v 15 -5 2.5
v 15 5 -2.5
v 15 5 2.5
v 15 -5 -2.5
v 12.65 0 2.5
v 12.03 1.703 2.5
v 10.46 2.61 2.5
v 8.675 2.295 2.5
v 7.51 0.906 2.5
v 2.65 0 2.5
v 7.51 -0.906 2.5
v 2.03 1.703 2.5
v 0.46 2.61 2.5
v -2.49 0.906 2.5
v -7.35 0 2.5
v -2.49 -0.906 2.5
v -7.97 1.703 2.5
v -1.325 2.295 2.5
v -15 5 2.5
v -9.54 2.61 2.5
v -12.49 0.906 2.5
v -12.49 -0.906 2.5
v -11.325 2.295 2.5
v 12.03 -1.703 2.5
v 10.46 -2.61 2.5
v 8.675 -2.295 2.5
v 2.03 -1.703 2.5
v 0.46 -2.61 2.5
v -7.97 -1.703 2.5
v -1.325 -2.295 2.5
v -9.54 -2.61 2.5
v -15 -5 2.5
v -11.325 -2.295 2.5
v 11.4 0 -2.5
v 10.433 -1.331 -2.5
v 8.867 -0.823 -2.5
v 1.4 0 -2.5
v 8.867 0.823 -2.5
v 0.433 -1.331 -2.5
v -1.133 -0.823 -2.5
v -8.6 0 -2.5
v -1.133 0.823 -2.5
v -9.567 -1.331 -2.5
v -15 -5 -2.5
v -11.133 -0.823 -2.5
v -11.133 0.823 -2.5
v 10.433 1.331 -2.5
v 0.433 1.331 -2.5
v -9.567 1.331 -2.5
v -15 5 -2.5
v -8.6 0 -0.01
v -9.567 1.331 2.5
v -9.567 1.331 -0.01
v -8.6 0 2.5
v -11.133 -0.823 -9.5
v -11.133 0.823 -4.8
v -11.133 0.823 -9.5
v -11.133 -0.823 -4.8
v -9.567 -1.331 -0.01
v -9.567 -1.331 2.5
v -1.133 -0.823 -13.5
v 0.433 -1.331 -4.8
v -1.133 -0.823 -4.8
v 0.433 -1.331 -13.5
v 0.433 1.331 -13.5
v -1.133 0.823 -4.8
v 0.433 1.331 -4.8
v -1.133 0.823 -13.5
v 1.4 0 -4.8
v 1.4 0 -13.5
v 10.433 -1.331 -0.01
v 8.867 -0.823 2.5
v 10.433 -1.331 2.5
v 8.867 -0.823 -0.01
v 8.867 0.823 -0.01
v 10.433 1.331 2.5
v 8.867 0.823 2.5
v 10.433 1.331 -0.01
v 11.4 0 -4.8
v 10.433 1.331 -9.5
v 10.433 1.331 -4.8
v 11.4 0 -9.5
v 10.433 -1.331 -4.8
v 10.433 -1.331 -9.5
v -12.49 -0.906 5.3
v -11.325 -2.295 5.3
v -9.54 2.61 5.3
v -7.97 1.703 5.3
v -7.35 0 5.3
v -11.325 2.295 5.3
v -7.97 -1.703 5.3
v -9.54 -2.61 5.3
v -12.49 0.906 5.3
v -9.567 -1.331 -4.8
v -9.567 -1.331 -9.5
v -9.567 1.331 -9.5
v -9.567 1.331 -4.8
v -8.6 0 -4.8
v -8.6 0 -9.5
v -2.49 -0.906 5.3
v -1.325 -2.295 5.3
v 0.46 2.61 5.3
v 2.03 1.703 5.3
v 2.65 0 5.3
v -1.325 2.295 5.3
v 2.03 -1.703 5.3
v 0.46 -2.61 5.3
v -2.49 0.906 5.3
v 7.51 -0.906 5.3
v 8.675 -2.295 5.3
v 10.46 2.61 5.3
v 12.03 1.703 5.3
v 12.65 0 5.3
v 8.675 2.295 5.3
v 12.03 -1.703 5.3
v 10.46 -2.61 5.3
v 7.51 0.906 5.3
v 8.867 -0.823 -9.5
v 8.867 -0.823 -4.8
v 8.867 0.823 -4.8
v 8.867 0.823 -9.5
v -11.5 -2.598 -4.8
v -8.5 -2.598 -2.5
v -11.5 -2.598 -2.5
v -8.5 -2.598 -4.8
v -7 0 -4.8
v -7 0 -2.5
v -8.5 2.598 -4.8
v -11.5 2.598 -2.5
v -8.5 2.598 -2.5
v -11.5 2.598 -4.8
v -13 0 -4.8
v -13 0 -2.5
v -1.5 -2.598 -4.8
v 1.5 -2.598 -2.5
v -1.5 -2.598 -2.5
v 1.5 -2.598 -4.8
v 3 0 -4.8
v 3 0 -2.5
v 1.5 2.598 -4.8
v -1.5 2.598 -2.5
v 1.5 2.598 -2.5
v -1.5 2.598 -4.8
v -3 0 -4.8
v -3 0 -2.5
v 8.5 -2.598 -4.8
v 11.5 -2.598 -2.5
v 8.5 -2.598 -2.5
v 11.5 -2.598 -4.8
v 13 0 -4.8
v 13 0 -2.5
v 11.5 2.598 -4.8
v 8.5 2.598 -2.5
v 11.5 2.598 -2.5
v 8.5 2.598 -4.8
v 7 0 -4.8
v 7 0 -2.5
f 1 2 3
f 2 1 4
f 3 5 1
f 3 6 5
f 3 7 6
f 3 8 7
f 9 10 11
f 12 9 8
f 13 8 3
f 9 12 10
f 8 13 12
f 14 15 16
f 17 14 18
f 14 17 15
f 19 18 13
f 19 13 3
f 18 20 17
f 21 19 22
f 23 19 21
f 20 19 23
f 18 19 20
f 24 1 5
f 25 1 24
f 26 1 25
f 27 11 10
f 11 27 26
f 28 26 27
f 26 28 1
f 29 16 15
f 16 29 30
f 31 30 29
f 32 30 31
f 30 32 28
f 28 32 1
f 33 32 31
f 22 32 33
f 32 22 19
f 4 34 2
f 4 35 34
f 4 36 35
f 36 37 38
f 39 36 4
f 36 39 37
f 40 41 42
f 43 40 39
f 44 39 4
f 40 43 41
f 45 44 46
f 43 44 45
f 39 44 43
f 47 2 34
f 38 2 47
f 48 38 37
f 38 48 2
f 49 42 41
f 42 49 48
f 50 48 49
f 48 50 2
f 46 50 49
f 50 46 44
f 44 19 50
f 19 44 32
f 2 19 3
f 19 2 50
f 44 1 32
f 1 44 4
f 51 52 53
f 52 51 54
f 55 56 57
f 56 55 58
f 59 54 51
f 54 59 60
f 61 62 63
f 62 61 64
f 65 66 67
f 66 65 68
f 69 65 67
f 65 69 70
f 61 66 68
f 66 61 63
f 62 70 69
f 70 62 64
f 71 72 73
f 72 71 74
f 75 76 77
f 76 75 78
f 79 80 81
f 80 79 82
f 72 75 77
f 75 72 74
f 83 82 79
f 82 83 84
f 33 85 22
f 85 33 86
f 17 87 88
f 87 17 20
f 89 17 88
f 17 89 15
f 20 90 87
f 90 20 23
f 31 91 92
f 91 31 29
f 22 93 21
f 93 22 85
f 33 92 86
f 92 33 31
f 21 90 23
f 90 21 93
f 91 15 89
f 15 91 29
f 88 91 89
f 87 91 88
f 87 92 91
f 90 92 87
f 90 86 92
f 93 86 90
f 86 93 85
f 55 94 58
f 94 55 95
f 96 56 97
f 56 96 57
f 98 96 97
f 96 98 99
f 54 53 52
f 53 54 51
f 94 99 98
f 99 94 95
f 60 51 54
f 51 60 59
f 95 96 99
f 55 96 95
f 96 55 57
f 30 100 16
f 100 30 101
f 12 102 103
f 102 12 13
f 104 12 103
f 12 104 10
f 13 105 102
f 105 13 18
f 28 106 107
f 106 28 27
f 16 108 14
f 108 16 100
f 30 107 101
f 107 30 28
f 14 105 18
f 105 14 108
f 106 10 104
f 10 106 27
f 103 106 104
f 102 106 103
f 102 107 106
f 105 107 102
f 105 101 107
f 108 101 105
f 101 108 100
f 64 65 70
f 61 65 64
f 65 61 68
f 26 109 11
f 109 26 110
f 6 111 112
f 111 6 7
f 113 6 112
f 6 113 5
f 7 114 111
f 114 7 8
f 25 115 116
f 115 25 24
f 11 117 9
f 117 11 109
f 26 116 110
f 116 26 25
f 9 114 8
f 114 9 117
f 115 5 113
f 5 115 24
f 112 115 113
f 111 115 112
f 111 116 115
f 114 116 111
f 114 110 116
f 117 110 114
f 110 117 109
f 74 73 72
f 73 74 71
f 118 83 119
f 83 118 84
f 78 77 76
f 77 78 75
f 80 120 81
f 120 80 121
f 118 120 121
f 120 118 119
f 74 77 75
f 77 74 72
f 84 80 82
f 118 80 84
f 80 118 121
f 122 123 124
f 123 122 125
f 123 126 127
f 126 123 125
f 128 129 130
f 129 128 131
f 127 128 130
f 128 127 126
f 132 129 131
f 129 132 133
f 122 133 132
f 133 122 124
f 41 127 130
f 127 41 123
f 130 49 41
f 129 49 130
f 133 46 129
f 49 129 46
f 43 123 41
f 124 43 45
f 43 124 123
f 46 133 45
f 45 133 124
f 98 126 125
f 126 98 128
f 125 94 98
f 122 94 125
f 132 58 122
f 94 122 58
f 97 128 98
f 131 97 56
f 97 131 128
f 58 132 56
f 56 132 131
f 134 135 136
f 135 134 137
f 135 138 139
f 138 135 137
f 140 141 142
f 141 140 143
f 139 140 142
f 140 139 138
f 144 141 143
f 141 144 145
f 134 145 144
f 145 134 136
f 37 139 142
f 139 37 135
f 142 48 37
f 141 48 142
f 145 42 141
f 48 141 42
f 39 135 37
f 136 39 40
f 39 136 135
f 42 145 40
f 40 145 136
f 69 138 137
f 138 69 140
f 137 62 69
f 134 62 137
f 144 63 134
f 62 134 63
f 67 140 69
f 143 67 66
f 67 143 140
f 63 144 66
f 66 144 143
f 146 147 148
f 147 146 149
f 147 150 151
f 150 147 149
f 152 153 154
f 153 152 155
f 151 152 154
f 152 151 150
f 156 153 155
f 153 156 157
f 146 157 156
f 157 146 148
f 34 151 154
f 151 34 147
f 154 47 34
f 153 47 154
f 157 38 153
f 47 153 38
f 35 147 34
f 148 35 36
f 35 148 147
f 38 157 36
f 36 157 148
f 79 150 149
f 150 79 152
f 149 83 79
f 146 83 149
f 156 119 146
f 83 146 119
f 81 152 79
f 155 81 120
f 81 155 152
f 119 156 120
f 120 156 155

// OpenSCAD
// Generated by SolidPython 1.0.5 on 2021-06-01 16:28:59


union() {
	color(alpha = 1.0000000000, c = "blue") {
		difference() {
			cube(center = true, size = [30, 10, 5]);
			translate(v = [-10, 0, 0]) {
				translate(v = [0, 0, -0.0100000000]) {
					cylinder(h = 5.0200000000, r = 1.4000000000);
				}
			}
			translate(v = [0, 0, -0.0100000000]) {
				cylinder(h = 5.0200000000, r = 1.4000000000);
			}
			translate(v = [10, 0, 0]) {
				translate(v = [0, 0, -0.0100000000]) {
					cylinder(h = 5.0200000000, r = 1.4000000000);
				}
			}
		}
	}
	translate(v = [-10, 0, 2.5000000000]) {
		union() {
			cylinder(h = 2.8000000000, r = 2.6500000000);
			translate(v = [0, 0, -12]) {
				cylinder(h = 12, r = 1.4000000000);
			}
		}
	}
	translate(v = [0, 0, 2.5000000000]) {
		union() {
			cylinder(h = 2.8000000000, r = 2.6500000000);
			translate(v = [0, 0, -16]) {
				cylinder(h = 16, r = 1.4000000000);
			}
		}
	}
	translate(v = [10, 0, 2.5000000000]) {
		union() {
			cylinder(h = 2.8000000000, r = 2.6500000000);
			translate(v = [0, 0, -12]) {
				cylinder(h = 12, r = 1.4000000000);
			}
		}
	}
	translate(v = [-10, 0, -4.8000000000]) {
		difference() {
			cylinder($fn = 6, h = 2.3000000000, r = 3);
			translate(v = [0, 0, -0.0100000000]) {
				cylinder(h = 2.3200000000, r = 1.4000000000);
			}
		}
	}
	translate(v = [0, 0, -4.8000000000]) {
		difference() {
			cylinder($fn = 6, h = 2.3000000000, r = 3);
			translate(v = [0, 0, -0.0100000000]) {
				cylinder(h = 2.3200000000, r = 1.4000000000);
			}
		}
	}
	translate(v = [10, 0, -4.8000000000]) {
		difference() {
			cylinder($fn = 6, h = 2.3000000000, r = 3);
			translate(v = [0, 0, -0.0100000000]) {
				cylinder(h = 2.3200000000, r = 1.4000000000);
			}
		}
	}
}
/***********************************************
*********      SolidPython code:      **********
************************************************
 
#! /usr/bin/env python3

# Basic shape with several repeated parts, demonstrating the use of
# solid.utils.bill_of_materials()
#
# Basically:
#   -- Define every part you want in the Bill of Materials in a function
#   -- Use the 'bom_part' decorator ahead of the definition of each part's function
#           e.g.:
# @bom_part()
# def my_part():
#     pass
#   -- Optionally, you can add a description and a per-unit cost to the
#       decorator invocations.
#
#   -- To generate the bill of materials, call solid.utils.bill_of_materials()
#
#       -ETJ 08 Mar 2011

import sys

from solid import scad_render_to_file
from solid.objects import cube, color, cylinder, difference, translate, union
from solid.utils import EPSILON
from solid.utils import bill_of_materials, bom_part, set_bom_headers

head_rad = 2.65
head_height = 2.8

nut_height = 2.3
nut_rad = 3

m3_rad = 1.4

doohickey_h = 5

set_bom_headers("link", "leftover")


def head():
    return cylinder(h=head_height, r=head_rad)


@bom_part("M3x16 Bolt", 0.12, currency="€", link="http://example.io/M3x16", leftover=0)
def m3_16(a=3):
    bolt_height = 16
    m = union()(
            head(),
            translate((0, 0, -bolt_height))(
                    cylinder(r=m3_rad, h=bolt_height)
            )
    )
    return m


@bom_part("M3x12 Bolt", 0.09, leftover=0)
def m3_12():
    bolt_height = 12
    m = union()(
            head(),
            translate((0, 0, -bolt_height))(
                    cylinder(r=m3_rad, h=bolt_height)
            )
    )
    return m


@bom_part("M3 Nut", 0.04, currency="R$")
def m3_nut():
    hx = cylinder(r=nut_rad, h=nut_height)
    hx.add_param('$fn', 6)  # make the nut hexagonal
    n = difference()(
            hx,
            translate((0, 0, -EPSILON))(
                    cylinder(r=m3_rad, h=nut_height + 2 * EPSILON)
            )
    )
    return n


@bom_part()
def doohickey(c):
    hole_cyl = translate((0, 0, -EPSILON))(
            cylinder(r=m3_rad, h=doohickey_h + 2 * EPSILON)
    )
    d = difference()(
            cube([30, 10, doohickey_h], center=True),
            translate((-10, 0, 0))(hole_cyl),
            hole_cyl,
            translate((10, 0, 0))(hole_cyl)
    )
    return color(c)(d)


def assembly():
    nut = m3_nut()
    return union()(
            doohickey(c='blue'),
            translate((-10, 0, doohickey_h / 2))(m3_12()),
            translate((0, 0, doohickey_h / 2))(m3_16()),
            translate((10, 0, doohickey_h / 2))(m3_12()),
            # Nuts
            translate((-10, 0, -nut_height - doohickey_h / 2))(nut),
            translate((0, 0, -nut_height - doohickey_h / 2))(nut),
            translate((10, 0, -nut_height - doohickey_h / 2))(nut),
    )


if __name__ == '__main__':
    out_dir = sys.argv[1] if len(sys.argv) > 1 else None

    a = assembly()
    bom = bill_of_materials(a)
    file_out = scad_render_to_file(a, out_dir=out_dir)

    print(f"{__file__}: SCAD file written to: \n{file_out}")
    print(bom)

    print("Or, Spreadsheet-ready TSV:\n\n")
    bom = bill_of_materials(a, csv=True)
    print(bom)
 
 
************************************************/
